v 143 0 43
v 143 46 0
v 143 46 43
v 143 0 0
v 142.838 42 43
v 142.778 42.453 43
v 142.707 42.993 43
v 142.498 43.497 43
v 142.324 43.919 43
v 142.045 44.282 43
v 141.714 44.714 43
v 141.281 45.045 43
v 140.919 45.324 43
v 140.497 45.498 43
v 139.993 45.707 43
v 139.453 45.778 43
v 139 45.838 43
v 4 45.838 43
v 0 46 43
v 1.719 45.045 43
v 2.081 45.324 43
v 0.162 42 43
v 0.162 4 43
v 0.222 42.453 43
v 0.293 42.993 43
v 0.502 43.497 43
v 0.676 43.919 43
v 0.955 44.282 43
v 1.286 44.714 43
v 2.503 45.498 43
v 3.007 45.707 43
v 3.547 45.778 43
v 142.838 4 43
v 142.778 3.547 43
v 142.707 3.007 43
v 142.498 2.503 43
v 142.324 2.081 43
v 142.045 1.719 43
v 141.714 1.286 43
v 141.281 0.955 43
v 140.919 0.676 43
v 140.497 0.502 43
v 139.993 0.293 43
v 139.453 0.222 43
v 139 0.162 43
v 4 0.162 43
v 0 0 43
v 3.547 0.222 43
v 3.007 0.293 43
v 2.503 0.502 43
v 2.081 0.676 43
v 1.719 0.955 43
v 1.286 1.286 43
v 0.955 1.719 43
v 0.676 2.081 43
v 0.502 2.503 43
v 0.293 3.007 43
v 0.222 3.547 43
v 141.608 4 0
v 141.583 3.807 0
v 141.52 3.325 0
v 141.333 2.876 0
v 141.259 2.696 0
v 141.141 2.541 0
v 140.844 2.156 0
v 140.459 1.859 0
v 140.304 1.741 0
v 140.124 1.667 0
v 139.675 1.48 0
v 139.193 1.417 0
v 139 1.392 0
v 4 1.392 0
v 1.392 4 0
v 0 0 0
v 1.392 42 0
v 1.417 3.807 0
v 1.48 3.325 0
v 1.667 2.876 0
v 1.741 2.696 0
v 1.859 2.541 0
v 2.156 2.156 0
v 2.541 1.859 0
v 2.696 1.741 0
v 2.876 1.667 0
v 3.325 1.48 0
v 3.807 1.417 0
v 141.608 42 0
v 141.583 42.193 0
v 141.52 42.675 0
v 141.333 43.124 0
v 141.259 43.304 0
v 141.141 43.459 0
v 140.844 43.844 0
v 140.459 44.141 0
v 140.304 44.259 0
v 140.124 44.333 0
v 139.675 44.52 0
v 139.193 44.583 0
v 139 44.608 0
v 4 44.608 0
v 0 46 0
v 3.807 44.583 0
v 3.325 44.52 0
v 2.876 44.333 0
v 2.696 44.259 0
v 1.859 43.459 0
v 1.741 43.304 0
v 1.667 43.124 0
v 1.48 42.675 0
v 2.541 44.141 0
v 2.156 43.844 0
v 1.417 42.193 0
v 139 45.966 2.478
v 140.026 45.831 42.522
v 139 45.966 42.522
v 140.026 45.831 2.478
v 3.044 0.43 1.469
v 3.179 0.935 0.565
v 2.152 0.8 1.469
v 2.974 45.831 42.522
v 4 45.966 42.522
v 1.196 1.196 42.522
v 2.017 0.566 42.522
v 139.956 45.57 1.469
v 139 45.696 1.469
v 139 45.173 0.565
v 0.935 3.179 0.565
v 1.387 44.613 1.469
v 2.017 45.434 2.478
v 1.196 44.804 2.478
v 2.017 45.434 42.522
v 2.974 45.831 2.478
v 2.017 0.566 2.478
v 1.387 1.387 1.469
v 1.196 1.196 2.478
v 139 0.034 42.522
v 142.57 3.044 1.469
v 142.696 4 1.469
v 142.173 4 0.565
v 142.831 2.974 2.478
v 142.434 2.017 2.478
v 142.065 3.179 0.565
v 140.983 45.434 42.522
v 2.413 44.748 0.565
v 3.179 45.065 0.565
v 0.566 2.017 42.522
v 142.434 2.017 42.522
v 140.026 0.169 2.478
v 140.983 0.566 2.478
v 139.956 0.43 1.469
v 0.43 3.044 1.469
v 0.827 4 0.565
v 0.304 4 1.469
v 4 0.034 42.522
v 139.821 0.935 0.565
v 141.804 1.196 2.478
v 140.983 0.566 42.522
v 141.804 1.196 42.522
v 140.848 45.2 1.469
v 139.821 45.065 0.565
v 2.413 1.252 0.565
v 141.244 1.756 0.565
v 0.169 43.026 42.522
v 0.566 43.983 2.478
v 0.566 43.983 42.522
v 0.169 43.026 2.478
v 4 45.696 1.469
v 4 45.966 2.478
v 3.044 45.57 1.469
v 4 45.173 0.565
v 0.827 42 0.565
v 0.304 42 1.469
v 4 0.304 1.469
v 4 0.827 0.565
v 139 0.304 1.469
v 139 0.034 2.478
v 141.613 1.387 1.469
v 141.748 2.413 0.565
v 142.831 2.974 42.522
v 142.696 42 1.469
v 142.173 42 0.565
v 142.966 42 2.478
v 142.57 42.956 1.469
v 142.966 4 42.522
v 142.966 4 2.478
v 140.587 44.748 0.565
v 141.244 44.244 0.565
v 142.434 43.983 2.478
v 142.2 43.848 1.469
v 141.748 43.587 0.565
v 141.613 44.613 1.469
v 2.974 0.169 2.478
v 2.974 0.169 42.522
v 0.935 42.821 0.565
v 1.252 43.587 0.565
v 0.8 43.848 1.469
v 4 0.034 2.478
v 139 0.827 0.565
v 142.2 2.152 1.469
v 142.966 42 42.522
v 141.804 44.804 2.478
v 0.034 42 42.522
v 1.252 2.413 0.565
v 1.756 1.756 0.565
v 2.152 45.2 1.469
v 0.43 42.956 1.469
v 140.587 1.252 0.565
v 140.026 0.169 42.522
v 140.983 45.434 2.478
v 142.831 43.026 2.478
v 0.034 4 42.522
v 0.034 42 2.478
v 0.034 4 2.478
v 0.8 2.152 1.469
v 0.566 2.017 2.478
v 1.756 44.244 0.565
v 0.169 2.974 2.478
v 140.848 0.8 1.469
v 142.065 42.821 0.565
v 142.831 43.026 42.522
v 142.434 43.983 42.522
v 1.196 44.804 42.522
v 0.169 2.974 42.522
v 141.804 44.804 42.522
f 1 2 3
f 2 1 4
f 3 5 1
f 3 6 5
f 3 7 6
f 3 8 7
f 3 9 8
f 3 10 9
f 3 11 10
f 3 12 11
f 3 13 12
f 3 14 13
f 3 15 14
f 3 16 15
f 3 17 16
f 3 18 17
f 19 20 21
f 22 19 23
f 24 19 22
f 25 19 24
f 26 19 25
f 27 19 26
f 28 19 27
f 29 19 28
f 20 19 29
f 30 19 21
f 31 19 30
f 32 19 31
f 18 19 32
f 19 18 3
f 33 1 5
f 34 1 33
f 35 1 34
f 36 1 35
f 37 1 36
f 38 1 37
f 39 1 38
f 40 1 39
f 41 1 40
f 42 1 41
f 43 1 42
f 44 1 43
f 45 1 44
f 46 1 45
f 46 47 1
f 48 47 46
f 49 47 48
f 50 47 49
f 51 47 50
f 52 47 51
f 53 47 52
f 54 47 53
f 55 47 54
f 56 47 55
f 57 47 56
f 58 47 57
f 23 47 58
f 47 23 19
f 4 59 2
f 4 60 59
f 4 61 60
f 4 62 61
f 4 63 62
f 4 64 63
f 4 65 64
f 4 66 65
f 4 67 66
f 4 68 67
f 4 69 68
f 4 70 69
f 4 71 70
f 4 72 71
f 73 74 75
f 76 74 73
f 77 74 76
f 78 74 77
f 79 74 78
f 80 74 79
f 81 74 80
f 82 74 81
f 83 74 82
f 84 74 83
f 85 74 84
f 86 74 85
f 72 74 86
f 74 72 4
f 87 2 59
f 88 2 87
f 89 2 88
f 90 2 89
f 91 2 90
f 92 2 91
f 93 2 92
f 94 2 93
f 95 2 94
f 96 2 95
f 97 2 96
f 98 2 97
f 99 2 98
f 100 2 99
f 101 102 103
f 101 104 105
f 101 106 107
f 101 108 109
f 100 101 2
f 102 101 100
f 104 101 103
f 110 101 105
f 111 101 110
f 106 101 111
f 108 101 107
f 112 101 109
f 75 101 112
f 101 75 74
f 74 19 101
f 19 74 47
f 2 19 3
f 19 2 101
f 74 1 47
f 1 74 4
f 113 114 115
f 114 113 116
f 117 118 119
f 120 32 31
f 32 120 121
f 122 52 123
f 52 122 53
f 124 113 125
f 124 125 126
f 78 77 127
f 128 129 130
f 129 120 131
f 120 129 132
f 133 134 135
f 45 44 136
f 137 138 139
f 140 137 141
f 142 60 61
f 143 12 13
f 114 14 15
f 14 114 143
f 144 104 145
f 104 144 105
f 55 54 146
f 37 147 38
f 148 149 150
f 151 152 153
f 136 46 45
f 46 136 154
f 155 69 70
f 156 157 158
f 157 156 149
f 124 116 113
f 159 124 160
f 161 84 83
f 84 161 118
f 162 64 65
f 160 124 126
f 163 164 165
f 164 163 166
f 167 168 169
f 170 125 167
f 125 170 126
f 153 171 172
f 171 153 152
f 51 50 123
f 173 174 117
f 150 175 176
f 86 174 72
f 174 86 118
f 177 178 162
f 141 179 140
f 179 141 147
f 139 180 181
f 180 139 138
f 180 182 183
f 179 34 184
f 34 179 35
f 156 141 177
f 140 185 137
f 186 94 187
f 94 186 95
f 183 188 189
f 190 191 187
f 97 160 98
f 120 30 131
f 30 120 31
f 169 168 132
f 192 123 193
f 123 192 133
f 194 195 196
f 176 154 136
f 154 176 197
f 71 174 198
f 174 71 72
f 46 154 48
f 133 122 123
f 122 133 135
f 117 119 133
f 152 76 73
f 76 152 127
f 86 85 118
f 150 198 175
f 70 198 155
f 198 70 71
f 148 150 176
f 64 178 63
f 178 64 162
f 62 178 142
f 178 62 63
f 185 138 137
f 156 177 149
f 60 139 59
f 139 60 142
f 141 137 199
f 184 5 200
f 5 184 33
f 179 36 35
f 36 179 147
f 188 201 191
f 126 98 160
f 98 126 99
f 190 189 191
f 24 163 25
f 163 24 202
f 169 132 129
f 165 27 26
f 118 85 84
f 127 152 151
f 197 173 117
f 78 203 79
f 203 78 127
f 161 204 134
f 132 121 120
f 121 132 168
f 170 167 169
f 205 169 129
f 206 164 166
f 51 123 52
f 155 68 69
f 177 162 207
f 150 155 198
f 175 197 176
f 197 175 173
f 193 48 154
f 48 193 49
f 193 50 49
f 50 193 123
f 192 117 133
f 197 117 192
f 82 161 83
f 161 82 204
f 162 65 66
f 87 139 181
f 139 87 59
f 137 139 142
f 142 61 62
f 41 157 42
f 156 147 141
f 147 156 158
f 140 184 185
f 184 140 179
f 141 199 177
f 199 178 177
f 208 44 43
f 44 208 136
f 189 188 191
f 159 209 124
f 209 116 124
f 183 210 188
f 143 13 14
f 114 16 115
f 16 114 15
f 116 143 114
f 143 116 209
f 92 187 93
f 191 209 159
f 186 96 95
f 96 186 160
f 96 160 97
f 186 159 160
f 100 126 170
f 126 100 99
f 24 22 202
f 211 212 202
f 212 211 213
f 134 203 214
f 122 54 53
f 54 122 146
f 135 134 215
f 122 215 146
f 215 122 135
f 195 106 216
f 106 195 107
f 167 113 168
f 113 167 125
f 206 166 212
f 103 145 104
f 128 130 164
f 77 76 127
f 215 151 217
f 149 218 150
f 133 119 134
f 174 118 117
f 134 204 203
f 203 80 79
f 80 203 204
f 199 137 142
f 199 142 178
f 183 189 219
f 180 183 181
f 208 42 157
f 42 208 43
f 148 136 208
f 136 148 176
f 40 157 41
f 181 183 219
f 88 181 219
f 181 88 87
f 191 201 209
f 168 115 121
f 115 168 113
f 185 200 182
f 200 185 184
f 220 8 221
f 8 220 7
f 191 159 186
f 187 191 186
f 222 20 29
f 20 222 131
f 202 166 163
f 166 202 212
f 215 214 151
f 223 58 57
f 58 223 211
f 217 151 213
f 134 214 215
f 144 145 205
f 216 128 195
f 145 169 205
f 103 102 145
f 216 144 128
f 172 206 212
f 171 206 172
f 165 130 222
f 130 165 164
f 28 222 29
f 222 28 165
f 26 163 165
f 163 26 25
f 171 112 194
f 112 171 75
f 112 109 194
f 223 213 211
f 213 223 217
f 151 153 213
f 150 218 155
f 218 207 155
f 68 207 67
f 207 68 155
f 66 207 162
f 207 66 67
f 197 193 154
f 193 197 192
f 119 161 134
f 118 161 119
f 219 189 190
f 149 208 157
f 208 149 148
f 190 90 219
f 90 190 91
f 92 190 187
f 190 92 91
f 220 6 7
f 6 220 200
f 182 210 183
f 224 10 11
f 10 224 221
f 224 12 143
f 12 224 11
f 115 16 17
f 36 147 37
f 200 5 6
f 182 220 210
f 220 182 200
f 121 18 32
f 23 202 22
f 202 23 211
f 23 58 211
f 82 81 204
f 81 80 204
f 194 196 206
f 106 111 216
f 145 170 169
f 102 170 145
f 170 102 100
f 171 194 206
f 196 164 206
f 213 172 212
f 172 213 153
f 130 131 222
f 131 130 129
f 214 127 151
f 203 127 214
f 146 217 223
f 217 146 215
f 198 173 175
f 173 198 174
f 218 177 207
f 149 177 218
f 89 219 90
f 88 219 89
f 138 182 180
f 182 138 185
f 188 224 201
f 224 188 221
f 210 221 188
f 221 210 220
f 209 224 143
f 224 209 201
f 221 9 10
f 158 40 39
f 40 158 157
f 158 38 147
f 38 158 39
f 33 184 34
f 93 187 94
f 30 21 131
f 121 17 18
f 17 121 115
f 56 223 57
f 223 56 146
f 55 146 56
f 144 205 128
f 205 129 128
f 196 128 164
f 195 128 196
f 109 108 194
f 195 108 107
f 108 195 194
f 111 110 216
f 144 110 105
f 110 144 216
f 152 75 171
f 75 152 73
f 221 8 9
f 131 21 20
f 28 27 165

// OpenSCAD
// Battery Pack Pocket Fit Jig
// Verifies the battery compartment fits the BRR-2P4S-5200 pack
//
// Parametric — adjust clearances for your printer's tolerance.

// ===== PARAMETERS =====

pack_length = 135;   // mm (datasheet estimate)
pack_width  =  38;   // mm (datasheet estimate)
pack_height =  38;   // mm (datasheet estimate)
corner_r    =   4;   // mm (estimate)
clearance   =   1;   // mm — adjust for printer tolerance

wall_thick  =   3;   // mm
floor_thick =   3;   // mm
jig_w       = pack_width  + 2 * wall_thick + 2 * clearance;
jig_d       = pack_length + 2 * wall_thick + 2 * clearance;
jig_h       = pack_height + floor_thick + 2; // mm — pocket depth

$fn = 24;

module pocket_negative() {
    // The pocket shape the battery sits in
    translate([wall_thick + clearance, wall_thick + clearance, floor_thick]) {
        minkowski() {
            cube([pack_length, pack_width, pack_height + 1]);
            sphere(r=corner_r);
        }
    }
}

module jig() {
    difference() {
        // Outer block
        cube([jig_d, jig_w, jig_h]);
        // Inner pocket
        pocket_negative();
    }
}

jig();
